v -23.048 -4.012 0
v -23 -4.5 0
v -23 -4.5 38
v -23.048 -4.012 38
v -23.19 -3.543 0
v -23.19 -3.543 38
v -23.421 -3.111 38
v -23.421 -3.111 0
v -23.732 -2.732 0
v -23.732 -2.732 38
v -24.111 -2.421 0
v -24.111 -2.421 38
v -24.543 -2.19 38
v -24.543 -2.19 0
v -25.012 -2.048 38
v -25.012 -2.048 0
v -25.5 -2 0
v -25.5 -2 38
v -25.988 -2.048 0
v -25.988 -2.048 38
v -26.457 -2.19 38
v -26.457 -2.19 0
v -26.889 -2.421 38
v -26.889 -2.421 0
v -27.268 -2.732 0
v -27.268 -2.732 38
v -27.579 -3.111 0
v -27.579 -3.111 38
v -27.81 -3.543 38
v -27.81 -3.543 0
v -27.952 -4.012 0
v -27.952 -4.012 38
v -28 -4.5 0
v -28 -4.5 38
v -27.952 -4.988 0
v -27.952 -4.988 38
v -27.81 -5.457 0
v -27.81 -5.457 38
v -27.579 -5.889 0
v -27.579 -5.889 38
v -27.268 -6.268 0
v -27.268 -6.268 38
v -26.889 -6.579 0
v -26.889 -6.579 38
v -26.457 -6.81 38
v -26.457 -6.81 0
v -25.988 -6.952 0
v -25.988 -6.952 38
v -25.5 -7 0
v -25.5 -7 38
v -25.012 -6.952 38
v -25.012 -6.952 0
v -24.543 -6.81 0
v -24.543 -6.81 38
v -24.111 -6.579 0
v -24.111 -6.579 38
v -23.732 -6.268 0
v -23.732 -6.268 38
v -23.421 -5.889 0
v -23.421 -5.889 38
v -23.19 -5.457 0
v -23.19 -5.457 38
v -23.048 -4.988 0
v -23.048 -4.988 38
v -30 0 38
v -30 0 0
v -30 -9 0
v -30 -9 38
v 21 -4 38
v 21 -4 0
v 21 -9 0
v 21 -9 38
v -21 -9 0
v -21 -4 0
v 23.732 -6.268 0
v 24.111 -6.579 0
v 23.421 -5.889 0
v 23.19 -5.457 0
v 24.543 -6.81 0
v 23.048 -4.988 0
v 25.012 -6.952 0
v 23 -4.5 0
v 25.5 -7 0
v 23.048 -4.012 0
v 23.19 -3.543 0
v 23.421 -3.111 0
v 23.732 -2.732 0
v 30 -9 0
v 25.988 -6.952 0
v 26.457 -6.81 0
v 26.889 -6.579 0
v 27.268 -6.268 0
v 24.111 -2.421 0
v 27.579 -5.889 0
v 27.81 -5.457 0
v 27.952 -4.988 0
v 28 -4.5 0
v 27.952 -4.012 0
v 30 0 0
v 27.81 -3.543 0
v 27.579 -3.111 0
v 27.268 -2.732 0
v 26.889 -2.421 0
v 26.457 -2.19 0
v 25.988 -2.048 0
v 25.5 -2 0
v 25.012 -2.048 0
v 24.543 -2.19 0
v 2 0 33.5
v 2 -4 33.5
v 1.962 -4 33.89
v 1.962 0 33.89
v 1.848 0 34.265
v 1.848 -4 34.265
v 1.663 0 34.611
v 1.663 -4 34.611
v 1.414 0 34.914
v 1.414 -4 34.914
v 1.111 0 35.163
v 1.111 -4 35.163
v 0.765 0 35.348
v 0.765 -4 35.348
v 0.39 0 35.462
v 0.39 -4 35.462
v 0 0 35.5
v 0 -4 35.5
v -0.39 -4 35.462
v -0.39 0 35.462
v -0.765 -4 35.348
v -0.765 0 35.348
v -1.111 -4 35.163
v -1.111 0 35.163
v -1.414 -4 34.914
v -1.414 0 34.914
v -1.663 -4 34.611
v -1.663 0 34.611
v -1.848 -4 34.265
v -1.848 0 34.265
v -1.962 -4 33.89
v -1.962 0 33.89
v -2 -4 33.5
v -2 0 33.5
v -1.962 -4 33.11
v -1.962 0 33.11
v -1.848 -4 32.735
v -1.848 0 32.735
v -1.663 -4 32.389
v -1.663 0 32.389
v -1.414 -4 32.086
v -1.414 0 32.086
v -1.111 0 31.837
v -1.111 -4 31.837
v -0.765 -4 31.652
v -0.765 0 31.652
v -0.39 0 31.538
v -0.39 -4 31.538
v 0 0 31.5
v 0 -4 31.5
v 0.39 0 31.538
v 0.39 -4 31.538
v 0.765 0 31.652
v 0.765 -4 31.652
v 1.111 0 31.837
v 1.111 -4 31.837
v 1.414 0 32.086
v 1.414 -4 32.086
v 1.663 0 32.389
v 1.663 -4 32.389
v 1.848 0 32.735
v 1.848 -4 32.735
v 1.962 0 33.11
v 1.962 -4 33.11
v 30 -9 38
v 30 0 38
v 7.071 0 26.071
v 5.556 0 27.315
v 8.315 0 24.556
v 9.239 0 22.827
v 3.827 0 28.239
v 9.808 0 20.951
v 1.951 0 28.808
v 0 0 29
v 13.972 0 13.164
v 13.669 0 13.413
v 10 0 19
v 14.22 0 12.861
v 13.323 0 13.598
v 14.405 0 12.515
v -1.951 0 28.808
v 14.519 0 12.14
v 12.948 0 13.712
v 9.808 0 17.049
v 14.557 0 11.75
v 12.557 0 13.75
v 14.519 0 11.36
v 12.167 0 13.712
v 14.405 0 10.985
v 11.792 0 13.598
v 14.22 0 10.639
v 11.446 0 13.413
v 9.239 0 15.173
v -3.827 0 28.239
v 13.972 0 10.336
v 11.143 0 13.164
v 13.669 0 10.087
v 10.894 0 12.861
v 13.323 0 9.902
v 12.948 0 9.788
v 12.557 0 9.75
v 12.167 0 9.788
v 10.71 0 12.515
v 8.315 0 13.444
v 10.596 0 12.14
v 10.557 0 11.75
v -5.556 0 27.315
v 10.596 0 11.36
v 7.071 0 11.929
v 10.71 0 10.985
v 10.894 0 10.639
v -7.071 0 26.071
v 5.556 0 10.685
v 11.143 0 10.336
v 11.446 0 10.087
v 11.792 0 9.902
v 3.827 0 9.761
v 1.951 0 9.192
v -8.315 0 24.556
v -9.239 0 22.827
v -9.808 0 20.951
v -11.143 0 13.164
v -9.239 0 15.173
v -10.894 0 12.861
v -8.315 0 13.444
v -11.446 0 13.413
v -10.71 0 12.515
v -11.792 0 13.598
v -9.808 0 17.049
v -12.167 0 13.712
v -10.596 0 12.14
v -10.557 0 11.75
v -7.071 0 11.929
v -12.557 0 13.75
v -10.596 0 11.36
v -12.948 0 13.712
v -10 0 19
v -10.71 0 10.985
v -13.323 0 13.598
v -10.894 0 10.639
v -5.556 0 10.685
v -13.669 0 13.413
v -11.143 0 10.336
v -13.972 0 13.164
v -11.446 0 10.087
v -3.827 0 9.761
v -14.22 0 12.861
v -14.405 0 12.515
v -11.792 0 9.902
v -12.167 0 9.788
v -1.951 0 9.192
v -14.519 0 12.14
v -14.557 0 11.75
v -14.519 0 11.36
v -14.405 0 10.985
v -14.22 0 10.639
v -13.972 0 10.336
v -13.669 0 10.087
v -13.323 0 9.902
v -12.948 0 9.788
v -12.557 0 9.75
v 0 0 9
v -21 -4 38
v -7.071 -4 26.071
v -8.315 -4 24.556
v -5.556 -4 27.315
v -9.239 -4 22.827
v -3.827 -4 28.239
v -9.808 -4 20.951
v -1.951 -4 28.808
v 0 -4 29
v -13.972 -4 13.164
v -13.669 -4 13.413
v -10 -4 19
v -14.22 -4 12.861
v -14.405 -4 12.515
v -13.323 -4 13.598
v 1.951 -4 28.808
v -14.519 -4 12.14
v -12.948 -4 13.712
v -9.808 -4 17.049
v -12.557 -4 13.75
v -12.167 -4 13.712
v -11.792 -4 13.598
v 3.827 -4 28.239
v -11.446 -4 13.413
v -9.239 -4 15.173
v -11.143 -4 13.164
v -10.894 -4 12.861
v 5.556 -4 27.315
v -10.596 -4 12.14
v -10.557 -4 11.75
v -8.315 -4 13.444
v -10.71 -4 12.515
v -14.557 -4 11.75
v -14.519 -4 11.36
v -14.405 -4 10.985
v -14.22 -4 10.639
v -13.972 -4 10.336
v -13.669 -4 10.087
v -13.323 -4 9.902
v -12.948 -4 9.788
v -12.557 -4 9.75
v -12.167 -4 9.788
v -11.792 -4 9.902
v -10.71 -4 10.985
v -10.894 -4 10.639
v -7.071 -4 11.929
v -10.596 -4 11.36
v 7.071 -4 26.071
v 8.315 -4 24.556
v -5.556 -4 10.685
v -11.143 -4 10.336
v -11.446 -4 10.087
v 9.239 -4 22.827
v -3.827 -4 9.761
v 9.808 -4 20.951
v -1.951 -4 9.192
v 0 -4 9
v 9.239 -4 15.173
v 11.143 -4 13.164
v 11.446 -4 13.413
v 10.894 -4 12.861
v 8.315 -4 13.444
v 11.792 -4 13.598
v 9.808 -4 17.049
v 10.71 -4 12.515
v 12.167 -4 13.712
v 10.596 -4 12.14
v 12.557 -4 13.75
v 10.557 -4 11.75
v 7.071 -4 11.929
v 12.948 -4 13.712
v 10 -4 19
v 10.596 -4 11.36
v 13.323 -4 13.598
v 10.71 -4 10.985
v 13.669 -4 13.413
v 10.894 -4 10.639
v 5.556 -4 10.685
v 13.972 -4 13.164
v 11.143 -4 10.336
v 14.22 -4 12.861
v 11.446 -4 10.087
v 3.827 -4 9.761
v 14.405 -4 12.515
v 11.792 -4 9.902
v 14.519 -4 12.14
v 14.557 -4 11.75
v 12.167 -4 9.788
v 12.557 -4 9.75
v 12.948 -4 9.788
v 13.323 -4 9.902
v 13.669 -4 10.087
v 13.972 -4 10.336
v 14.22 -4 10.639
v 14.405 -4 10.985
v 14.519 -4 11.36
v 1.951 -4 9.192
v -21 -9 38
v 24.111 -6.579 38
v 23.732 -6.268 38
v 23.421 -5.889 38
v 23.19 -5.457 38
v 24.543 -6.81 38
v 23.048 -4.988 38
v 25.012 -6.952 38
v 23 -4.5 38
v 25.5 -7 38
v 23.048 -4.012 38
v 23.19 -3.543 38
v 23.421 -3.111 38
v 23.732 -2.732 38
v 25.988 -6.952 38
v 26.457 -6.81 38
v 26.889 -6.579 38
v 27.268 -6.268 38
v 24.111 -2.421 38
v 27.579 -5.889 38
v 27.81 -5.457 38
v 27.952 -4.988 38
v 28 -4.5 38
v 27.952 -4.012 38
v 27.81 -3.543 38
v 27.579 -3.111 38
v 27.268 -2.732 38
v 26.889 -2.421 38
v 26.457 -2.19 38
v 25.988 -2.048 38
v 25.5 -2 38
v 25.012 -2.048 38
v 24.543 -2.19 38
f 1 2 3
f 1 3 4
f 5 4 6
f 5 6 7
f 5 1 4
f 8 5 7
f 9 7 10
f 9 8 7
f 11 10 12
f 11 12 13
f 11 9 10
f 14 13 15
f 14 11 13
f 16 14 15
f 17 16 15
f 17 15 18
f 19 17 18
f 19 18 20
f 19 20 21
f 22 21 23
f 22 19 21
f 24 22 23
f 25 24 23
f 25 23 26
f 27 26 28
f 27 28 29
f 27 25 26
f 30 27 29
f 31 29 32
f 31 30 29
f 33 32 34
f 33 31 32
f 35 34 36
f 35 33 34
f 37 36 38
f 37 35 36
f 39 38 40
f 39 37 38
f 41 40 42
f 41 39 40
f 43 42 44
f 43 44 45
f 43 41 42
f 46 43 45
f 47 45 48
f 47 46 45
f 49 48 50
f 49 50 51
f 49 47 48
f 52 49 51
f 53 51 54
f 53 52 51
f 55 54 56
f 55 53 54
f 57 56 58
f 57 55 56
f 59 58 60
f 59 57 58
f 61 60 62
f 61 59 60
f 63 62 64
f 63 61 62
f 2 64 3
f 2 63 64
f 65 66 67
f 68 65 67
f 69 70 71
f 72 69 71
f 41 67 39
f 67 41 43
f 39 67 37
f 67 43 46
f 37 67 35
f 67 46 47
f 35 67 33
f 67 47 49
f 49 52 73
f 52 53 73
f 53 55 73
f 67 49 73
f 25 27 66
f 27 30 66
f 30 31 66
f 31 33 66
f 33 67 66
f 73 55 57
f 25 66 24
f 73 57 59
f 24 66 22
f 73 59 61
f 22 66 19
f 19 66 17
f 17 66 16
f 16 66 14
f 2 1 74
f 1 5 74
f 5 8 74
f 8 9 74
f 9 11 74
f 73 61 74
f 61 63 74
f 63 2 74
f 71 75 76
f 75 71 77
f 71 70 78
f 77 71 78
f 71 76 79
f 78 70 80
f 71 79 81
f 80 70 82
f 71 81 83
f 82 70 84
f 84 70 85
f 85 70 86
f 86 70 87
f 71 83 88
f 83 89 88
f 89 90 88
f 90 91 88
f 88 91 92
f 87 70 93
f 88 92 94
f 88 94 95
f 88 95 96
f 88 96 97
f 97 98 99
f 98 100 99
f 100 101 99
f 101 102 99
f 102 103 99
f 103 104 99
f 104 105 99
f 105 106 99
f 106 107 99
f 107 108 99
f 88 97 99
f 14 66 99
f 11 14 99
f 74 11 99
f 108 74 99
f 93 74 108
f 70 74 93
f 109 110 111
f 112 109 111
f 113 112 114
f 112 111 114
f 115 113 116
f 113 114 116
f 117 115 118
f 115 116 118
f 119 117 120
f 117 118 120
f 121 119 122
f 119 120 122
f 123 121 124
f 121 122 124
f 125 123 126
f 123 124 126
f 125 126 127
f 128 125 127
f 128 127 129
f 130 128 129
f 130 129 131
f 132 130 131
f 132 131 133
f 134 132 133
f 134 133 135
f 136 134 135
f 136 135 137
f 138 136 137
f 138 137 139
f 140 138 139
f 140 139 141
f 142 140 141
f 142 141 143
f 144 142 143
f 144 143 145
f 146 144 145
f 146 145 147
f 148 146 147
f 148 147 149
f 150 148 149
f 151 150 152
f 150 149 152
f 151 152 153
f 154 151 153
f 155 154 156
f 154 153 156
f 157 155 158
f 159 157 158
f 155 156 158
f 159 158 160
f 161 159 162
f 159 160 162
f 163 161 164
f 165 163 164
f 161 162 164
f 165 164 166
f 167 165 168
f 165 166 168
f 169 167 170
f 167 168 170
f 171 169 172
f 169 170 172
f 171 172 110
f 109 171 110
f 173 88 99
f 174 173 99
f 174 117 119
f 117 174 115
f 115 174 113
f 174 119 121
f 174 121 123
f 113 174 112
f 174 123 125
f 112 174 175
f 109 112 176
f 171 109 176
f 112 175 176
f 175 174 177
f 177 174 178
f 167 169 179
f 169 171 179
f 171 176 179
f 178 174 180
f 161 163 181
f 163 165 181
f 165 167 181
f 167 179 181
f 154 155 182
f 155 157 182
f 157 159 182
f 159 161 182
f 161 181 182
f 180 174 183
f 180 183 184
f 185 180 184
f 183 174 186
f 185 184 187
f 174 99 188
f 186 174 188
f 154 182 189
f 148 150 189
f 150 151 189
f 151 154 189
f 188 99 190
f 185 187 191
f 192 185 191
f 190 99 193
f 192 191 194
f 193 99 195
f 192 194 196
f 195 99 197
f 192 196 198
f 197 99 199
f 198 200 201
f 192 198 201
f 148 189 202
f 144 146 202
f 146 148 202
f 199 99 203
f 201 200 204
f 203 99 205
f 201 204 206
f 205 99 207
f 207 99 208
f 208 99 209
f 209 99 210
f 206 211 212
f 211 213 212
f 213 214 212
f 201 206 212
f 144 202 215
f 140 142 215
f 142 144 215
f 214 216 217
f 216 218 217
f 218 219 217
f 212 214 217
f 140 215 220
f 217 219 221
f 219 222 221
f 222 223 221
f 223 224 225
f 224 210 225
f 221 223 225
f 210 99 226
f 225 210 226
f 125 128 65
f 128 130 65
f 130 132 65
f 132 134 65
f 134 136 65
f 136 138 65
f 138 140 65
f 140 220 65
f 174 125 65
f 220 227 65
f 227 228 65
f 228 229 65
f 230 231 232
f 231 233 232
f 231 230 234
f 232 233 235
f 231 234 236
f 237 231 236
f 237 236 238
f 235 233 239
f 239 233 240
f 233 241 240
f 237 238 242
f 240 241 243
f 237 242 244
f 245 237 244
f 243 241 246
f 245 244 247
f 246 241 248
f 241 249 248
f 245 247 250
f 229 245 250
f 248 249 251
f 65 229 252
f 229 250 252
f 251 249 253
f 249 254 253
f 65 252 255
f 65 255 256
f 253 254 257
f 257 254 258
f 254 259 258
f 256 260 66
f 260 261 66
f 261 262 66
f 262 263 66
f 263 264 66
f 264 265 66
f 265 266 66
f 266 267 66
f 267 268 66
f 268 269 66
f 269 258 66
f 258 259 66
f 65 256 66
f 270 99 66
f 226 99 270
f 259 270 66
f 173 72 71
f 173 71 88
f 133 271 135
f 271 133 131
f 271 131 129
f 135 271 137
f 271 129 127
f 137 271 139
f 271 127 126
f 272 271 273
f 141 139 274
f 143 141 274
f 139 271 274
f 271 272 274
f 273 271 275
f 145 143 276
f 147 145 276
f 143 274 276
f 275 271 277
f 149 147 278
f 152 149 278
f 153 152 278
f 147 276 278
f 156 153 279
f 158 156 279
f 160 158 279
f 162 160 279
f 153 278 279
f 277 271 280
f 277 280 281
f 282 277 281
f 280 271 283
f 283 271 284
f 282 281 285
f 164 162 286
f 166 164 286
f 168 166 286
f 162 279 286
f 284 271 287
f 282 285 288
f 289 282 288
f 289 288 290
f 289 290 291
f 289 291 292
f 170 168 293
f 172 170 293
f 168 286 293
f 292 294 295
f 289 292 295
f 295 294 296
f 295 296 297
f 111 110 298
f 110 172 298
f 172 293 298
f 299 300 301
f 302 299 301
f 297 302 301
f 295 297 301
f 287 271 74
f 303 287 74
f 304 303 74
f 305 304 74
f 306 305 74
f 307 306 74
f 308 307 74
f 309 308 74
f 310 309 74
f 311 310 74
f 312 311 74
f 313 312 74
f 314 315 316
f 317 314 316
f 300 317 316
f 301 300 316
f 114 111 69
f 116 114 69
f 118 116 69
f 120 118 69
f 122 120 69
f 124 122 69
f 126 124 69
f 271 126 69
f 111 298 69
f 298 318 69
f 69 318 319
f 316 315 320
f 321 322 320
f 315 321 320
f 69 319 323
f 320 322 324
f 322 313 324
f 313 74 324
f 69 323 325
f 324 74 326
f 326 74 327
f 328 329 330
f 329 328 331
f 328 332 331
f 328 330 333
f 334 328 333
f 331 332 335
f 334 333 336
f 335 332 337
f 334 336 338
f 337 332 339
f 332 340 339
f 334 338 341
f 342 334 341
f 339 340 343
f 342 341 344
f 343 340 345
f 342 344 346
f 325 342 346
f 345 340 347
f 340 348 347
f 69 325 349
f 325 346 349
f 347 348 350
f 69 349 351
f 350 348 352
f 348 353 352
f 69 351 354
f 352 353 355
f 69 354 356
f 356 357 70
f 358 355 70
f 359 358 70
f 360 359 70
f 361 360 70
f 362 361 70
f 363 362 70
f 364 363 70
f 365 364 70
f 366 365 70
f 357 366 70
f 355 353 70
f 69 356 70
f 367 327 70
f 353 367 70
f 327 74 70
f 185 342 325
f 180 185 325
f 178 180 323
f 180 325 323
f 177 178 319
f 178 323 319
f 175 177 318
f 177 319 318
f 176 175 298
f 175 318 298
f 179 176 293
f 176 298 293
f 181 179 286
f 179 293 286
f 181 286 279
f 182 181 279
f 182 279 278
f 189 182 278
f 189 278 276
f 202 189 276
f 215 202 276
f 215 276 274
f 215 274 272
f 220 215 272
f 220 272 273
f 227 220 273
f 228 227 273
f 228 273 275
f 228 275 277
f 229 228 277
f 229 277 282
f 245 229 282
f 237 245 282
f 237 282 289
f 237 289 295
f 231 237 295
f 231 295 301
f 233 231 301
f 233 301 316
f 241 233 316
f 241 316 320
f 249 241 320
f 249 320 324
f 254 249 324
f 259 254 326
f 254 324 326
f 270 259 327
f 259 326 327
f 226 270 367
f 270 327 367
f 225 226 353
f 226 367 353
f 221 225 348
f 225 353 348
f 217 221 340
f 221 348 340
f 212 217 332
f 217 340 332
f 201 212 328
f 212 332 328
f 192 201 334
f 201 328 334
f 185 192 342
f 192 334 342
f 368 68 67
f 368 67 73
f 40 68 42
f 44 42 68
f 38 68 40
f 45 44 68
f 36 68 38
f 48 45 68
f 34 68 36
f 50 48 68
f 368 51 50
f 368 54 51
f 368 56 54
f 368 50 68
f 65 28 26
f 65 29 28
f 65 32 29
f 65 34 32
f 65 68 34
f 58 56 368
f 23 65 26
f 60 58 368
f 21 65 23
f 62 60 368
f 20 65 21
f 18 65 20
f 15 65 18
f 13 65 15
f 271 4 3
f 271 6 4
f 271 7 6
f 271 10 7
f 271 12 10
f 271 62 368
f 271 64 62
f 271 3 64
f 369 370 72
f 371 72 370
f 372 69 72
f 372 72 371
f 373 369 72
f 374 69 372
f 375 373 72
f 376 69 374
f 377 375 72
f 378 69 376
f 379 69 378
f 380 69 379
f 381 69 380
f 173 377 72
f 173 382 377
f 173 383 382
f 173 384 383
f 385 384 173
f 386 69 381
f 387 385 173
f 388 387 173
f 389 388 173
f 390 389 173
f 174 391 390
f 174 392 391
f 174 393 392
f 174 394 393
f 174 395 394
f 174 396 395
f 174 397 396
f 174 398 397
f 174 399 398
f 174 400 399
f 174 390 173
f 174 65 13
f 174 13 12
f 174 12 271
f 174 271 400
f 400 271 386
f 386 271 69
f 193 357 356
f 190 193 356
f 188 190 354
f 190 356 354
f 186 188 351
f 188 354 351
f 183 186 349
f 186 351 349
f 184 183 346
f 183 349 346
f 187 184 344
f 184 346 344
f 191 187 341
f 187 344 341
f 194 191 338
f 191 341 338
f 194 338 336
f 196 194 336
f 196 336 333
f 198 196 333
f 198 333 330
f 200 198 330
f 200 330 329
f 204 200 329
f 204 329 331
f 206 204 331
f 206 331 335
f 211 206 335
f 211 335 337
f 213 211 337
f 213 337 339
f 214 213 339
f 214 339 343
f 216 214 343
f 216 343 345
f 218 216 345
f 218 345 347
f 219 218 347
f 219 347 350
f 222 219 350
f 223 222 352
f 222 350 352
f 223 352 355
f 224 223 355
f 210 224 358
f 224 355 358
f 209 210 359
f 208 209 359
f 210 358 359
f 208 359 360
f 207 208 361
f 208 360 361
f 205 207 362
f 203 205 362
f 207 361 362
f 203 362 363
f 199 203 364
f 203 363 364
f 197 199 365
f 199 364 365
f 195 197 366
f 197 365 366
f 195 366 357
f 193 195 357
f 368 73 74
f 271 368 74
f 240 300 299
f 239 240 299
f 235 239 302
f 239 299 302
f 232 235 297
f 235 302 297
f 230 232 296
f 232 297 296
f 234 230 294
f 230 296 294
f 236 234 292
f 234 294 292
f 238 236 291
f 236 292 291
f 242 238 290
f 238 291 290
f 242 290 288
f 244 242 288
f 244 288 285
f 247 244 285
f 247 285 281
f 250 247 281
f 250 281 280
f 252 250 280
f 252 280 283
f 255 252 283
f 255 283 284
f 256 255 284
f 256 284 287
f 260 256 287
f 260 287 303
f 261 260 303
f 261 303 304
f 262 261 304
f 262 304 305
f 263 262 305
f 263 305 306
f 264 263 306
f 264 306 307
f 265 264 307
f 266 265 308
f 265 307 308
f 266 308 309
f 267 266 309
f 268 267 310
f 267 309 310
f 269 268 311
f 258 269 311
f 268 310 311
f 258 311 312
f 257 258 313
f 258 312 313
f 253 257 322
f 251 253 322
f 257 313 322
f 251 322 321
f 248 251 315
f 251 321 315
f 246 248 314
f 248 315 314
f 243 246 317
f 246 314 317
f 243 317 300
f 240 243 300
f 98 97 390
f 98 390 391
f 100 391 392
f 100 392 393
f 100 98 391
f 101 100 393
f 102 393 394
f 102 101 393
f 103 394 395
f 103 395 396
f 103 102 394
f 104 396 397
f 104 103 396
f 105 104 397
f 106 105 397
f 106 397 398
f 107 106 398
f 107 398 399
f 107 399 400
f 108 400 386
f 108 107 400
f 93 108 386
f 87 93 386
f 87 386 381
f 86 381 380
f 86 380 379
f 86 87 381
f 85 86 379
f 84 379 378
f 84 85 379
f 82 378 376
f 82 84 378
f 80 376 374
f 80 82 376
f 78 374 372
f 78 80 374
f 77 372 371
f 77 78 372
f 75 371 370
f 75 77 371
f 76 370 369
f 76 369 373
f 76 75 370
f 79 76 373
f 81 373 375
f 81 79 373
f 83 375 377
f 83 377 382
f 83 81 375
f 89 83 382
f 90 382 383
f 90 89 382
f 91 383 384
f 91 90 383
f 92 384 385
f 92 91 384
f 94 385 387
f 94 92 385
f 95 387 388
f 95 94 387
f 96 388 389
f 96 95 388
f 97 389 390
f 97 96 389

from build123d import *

# Parameters (mm, degrees)
SKETCH1_R           = 2.5
BOSS_EXTRUDE1_DEPTH = 38
SKETCH2_R           = 10
SKETCH2_R_2         = 2
CUT_EXTRUDE1_DEPTH  = 38


with BuildPart() as part:
    # Sketch1 → Boss-Extrude1 (new body)
    with BuildSketch(Plane.XY):
        Polygon((-30, 0), (-30, -9), (-21, -9), (-21, -4), (21, -4), (21, -9), (30, -9), (30, 0), align=None)
        with Locations((-25.5, -4.5)):
            Circle(SKETCH1_R, mode=Mode.SUBTRACT)
        with Locations((25.5, -4.5)):
            Circle(SKETCH1_R, mode=Mode.SUBTRACT)
    extrude(amount=BOSS_EXTRUDE1_DEPTH)

    # Sketch2 → Cut-Extrude1 (cut)
    with BuildSketch(Plane.XZ.offset(4)):
        with Locations((0, 19)):
            Circle(SKETCH2_R)
        with Locations((0, 33.5)):
            Circle(SKETCH2_R_2)
        with Locations((12.557368355, 11.75)):
            Circle(SKETCH2_R_2)
        with Locations((-12.557368355, 11.75)):
            Circle(SKETCH2_R_2)
    extrude(amount=-CUT_EXTRUDE1_DEPTH, mode=Mode.SUBTRACT)


solid = part.part
